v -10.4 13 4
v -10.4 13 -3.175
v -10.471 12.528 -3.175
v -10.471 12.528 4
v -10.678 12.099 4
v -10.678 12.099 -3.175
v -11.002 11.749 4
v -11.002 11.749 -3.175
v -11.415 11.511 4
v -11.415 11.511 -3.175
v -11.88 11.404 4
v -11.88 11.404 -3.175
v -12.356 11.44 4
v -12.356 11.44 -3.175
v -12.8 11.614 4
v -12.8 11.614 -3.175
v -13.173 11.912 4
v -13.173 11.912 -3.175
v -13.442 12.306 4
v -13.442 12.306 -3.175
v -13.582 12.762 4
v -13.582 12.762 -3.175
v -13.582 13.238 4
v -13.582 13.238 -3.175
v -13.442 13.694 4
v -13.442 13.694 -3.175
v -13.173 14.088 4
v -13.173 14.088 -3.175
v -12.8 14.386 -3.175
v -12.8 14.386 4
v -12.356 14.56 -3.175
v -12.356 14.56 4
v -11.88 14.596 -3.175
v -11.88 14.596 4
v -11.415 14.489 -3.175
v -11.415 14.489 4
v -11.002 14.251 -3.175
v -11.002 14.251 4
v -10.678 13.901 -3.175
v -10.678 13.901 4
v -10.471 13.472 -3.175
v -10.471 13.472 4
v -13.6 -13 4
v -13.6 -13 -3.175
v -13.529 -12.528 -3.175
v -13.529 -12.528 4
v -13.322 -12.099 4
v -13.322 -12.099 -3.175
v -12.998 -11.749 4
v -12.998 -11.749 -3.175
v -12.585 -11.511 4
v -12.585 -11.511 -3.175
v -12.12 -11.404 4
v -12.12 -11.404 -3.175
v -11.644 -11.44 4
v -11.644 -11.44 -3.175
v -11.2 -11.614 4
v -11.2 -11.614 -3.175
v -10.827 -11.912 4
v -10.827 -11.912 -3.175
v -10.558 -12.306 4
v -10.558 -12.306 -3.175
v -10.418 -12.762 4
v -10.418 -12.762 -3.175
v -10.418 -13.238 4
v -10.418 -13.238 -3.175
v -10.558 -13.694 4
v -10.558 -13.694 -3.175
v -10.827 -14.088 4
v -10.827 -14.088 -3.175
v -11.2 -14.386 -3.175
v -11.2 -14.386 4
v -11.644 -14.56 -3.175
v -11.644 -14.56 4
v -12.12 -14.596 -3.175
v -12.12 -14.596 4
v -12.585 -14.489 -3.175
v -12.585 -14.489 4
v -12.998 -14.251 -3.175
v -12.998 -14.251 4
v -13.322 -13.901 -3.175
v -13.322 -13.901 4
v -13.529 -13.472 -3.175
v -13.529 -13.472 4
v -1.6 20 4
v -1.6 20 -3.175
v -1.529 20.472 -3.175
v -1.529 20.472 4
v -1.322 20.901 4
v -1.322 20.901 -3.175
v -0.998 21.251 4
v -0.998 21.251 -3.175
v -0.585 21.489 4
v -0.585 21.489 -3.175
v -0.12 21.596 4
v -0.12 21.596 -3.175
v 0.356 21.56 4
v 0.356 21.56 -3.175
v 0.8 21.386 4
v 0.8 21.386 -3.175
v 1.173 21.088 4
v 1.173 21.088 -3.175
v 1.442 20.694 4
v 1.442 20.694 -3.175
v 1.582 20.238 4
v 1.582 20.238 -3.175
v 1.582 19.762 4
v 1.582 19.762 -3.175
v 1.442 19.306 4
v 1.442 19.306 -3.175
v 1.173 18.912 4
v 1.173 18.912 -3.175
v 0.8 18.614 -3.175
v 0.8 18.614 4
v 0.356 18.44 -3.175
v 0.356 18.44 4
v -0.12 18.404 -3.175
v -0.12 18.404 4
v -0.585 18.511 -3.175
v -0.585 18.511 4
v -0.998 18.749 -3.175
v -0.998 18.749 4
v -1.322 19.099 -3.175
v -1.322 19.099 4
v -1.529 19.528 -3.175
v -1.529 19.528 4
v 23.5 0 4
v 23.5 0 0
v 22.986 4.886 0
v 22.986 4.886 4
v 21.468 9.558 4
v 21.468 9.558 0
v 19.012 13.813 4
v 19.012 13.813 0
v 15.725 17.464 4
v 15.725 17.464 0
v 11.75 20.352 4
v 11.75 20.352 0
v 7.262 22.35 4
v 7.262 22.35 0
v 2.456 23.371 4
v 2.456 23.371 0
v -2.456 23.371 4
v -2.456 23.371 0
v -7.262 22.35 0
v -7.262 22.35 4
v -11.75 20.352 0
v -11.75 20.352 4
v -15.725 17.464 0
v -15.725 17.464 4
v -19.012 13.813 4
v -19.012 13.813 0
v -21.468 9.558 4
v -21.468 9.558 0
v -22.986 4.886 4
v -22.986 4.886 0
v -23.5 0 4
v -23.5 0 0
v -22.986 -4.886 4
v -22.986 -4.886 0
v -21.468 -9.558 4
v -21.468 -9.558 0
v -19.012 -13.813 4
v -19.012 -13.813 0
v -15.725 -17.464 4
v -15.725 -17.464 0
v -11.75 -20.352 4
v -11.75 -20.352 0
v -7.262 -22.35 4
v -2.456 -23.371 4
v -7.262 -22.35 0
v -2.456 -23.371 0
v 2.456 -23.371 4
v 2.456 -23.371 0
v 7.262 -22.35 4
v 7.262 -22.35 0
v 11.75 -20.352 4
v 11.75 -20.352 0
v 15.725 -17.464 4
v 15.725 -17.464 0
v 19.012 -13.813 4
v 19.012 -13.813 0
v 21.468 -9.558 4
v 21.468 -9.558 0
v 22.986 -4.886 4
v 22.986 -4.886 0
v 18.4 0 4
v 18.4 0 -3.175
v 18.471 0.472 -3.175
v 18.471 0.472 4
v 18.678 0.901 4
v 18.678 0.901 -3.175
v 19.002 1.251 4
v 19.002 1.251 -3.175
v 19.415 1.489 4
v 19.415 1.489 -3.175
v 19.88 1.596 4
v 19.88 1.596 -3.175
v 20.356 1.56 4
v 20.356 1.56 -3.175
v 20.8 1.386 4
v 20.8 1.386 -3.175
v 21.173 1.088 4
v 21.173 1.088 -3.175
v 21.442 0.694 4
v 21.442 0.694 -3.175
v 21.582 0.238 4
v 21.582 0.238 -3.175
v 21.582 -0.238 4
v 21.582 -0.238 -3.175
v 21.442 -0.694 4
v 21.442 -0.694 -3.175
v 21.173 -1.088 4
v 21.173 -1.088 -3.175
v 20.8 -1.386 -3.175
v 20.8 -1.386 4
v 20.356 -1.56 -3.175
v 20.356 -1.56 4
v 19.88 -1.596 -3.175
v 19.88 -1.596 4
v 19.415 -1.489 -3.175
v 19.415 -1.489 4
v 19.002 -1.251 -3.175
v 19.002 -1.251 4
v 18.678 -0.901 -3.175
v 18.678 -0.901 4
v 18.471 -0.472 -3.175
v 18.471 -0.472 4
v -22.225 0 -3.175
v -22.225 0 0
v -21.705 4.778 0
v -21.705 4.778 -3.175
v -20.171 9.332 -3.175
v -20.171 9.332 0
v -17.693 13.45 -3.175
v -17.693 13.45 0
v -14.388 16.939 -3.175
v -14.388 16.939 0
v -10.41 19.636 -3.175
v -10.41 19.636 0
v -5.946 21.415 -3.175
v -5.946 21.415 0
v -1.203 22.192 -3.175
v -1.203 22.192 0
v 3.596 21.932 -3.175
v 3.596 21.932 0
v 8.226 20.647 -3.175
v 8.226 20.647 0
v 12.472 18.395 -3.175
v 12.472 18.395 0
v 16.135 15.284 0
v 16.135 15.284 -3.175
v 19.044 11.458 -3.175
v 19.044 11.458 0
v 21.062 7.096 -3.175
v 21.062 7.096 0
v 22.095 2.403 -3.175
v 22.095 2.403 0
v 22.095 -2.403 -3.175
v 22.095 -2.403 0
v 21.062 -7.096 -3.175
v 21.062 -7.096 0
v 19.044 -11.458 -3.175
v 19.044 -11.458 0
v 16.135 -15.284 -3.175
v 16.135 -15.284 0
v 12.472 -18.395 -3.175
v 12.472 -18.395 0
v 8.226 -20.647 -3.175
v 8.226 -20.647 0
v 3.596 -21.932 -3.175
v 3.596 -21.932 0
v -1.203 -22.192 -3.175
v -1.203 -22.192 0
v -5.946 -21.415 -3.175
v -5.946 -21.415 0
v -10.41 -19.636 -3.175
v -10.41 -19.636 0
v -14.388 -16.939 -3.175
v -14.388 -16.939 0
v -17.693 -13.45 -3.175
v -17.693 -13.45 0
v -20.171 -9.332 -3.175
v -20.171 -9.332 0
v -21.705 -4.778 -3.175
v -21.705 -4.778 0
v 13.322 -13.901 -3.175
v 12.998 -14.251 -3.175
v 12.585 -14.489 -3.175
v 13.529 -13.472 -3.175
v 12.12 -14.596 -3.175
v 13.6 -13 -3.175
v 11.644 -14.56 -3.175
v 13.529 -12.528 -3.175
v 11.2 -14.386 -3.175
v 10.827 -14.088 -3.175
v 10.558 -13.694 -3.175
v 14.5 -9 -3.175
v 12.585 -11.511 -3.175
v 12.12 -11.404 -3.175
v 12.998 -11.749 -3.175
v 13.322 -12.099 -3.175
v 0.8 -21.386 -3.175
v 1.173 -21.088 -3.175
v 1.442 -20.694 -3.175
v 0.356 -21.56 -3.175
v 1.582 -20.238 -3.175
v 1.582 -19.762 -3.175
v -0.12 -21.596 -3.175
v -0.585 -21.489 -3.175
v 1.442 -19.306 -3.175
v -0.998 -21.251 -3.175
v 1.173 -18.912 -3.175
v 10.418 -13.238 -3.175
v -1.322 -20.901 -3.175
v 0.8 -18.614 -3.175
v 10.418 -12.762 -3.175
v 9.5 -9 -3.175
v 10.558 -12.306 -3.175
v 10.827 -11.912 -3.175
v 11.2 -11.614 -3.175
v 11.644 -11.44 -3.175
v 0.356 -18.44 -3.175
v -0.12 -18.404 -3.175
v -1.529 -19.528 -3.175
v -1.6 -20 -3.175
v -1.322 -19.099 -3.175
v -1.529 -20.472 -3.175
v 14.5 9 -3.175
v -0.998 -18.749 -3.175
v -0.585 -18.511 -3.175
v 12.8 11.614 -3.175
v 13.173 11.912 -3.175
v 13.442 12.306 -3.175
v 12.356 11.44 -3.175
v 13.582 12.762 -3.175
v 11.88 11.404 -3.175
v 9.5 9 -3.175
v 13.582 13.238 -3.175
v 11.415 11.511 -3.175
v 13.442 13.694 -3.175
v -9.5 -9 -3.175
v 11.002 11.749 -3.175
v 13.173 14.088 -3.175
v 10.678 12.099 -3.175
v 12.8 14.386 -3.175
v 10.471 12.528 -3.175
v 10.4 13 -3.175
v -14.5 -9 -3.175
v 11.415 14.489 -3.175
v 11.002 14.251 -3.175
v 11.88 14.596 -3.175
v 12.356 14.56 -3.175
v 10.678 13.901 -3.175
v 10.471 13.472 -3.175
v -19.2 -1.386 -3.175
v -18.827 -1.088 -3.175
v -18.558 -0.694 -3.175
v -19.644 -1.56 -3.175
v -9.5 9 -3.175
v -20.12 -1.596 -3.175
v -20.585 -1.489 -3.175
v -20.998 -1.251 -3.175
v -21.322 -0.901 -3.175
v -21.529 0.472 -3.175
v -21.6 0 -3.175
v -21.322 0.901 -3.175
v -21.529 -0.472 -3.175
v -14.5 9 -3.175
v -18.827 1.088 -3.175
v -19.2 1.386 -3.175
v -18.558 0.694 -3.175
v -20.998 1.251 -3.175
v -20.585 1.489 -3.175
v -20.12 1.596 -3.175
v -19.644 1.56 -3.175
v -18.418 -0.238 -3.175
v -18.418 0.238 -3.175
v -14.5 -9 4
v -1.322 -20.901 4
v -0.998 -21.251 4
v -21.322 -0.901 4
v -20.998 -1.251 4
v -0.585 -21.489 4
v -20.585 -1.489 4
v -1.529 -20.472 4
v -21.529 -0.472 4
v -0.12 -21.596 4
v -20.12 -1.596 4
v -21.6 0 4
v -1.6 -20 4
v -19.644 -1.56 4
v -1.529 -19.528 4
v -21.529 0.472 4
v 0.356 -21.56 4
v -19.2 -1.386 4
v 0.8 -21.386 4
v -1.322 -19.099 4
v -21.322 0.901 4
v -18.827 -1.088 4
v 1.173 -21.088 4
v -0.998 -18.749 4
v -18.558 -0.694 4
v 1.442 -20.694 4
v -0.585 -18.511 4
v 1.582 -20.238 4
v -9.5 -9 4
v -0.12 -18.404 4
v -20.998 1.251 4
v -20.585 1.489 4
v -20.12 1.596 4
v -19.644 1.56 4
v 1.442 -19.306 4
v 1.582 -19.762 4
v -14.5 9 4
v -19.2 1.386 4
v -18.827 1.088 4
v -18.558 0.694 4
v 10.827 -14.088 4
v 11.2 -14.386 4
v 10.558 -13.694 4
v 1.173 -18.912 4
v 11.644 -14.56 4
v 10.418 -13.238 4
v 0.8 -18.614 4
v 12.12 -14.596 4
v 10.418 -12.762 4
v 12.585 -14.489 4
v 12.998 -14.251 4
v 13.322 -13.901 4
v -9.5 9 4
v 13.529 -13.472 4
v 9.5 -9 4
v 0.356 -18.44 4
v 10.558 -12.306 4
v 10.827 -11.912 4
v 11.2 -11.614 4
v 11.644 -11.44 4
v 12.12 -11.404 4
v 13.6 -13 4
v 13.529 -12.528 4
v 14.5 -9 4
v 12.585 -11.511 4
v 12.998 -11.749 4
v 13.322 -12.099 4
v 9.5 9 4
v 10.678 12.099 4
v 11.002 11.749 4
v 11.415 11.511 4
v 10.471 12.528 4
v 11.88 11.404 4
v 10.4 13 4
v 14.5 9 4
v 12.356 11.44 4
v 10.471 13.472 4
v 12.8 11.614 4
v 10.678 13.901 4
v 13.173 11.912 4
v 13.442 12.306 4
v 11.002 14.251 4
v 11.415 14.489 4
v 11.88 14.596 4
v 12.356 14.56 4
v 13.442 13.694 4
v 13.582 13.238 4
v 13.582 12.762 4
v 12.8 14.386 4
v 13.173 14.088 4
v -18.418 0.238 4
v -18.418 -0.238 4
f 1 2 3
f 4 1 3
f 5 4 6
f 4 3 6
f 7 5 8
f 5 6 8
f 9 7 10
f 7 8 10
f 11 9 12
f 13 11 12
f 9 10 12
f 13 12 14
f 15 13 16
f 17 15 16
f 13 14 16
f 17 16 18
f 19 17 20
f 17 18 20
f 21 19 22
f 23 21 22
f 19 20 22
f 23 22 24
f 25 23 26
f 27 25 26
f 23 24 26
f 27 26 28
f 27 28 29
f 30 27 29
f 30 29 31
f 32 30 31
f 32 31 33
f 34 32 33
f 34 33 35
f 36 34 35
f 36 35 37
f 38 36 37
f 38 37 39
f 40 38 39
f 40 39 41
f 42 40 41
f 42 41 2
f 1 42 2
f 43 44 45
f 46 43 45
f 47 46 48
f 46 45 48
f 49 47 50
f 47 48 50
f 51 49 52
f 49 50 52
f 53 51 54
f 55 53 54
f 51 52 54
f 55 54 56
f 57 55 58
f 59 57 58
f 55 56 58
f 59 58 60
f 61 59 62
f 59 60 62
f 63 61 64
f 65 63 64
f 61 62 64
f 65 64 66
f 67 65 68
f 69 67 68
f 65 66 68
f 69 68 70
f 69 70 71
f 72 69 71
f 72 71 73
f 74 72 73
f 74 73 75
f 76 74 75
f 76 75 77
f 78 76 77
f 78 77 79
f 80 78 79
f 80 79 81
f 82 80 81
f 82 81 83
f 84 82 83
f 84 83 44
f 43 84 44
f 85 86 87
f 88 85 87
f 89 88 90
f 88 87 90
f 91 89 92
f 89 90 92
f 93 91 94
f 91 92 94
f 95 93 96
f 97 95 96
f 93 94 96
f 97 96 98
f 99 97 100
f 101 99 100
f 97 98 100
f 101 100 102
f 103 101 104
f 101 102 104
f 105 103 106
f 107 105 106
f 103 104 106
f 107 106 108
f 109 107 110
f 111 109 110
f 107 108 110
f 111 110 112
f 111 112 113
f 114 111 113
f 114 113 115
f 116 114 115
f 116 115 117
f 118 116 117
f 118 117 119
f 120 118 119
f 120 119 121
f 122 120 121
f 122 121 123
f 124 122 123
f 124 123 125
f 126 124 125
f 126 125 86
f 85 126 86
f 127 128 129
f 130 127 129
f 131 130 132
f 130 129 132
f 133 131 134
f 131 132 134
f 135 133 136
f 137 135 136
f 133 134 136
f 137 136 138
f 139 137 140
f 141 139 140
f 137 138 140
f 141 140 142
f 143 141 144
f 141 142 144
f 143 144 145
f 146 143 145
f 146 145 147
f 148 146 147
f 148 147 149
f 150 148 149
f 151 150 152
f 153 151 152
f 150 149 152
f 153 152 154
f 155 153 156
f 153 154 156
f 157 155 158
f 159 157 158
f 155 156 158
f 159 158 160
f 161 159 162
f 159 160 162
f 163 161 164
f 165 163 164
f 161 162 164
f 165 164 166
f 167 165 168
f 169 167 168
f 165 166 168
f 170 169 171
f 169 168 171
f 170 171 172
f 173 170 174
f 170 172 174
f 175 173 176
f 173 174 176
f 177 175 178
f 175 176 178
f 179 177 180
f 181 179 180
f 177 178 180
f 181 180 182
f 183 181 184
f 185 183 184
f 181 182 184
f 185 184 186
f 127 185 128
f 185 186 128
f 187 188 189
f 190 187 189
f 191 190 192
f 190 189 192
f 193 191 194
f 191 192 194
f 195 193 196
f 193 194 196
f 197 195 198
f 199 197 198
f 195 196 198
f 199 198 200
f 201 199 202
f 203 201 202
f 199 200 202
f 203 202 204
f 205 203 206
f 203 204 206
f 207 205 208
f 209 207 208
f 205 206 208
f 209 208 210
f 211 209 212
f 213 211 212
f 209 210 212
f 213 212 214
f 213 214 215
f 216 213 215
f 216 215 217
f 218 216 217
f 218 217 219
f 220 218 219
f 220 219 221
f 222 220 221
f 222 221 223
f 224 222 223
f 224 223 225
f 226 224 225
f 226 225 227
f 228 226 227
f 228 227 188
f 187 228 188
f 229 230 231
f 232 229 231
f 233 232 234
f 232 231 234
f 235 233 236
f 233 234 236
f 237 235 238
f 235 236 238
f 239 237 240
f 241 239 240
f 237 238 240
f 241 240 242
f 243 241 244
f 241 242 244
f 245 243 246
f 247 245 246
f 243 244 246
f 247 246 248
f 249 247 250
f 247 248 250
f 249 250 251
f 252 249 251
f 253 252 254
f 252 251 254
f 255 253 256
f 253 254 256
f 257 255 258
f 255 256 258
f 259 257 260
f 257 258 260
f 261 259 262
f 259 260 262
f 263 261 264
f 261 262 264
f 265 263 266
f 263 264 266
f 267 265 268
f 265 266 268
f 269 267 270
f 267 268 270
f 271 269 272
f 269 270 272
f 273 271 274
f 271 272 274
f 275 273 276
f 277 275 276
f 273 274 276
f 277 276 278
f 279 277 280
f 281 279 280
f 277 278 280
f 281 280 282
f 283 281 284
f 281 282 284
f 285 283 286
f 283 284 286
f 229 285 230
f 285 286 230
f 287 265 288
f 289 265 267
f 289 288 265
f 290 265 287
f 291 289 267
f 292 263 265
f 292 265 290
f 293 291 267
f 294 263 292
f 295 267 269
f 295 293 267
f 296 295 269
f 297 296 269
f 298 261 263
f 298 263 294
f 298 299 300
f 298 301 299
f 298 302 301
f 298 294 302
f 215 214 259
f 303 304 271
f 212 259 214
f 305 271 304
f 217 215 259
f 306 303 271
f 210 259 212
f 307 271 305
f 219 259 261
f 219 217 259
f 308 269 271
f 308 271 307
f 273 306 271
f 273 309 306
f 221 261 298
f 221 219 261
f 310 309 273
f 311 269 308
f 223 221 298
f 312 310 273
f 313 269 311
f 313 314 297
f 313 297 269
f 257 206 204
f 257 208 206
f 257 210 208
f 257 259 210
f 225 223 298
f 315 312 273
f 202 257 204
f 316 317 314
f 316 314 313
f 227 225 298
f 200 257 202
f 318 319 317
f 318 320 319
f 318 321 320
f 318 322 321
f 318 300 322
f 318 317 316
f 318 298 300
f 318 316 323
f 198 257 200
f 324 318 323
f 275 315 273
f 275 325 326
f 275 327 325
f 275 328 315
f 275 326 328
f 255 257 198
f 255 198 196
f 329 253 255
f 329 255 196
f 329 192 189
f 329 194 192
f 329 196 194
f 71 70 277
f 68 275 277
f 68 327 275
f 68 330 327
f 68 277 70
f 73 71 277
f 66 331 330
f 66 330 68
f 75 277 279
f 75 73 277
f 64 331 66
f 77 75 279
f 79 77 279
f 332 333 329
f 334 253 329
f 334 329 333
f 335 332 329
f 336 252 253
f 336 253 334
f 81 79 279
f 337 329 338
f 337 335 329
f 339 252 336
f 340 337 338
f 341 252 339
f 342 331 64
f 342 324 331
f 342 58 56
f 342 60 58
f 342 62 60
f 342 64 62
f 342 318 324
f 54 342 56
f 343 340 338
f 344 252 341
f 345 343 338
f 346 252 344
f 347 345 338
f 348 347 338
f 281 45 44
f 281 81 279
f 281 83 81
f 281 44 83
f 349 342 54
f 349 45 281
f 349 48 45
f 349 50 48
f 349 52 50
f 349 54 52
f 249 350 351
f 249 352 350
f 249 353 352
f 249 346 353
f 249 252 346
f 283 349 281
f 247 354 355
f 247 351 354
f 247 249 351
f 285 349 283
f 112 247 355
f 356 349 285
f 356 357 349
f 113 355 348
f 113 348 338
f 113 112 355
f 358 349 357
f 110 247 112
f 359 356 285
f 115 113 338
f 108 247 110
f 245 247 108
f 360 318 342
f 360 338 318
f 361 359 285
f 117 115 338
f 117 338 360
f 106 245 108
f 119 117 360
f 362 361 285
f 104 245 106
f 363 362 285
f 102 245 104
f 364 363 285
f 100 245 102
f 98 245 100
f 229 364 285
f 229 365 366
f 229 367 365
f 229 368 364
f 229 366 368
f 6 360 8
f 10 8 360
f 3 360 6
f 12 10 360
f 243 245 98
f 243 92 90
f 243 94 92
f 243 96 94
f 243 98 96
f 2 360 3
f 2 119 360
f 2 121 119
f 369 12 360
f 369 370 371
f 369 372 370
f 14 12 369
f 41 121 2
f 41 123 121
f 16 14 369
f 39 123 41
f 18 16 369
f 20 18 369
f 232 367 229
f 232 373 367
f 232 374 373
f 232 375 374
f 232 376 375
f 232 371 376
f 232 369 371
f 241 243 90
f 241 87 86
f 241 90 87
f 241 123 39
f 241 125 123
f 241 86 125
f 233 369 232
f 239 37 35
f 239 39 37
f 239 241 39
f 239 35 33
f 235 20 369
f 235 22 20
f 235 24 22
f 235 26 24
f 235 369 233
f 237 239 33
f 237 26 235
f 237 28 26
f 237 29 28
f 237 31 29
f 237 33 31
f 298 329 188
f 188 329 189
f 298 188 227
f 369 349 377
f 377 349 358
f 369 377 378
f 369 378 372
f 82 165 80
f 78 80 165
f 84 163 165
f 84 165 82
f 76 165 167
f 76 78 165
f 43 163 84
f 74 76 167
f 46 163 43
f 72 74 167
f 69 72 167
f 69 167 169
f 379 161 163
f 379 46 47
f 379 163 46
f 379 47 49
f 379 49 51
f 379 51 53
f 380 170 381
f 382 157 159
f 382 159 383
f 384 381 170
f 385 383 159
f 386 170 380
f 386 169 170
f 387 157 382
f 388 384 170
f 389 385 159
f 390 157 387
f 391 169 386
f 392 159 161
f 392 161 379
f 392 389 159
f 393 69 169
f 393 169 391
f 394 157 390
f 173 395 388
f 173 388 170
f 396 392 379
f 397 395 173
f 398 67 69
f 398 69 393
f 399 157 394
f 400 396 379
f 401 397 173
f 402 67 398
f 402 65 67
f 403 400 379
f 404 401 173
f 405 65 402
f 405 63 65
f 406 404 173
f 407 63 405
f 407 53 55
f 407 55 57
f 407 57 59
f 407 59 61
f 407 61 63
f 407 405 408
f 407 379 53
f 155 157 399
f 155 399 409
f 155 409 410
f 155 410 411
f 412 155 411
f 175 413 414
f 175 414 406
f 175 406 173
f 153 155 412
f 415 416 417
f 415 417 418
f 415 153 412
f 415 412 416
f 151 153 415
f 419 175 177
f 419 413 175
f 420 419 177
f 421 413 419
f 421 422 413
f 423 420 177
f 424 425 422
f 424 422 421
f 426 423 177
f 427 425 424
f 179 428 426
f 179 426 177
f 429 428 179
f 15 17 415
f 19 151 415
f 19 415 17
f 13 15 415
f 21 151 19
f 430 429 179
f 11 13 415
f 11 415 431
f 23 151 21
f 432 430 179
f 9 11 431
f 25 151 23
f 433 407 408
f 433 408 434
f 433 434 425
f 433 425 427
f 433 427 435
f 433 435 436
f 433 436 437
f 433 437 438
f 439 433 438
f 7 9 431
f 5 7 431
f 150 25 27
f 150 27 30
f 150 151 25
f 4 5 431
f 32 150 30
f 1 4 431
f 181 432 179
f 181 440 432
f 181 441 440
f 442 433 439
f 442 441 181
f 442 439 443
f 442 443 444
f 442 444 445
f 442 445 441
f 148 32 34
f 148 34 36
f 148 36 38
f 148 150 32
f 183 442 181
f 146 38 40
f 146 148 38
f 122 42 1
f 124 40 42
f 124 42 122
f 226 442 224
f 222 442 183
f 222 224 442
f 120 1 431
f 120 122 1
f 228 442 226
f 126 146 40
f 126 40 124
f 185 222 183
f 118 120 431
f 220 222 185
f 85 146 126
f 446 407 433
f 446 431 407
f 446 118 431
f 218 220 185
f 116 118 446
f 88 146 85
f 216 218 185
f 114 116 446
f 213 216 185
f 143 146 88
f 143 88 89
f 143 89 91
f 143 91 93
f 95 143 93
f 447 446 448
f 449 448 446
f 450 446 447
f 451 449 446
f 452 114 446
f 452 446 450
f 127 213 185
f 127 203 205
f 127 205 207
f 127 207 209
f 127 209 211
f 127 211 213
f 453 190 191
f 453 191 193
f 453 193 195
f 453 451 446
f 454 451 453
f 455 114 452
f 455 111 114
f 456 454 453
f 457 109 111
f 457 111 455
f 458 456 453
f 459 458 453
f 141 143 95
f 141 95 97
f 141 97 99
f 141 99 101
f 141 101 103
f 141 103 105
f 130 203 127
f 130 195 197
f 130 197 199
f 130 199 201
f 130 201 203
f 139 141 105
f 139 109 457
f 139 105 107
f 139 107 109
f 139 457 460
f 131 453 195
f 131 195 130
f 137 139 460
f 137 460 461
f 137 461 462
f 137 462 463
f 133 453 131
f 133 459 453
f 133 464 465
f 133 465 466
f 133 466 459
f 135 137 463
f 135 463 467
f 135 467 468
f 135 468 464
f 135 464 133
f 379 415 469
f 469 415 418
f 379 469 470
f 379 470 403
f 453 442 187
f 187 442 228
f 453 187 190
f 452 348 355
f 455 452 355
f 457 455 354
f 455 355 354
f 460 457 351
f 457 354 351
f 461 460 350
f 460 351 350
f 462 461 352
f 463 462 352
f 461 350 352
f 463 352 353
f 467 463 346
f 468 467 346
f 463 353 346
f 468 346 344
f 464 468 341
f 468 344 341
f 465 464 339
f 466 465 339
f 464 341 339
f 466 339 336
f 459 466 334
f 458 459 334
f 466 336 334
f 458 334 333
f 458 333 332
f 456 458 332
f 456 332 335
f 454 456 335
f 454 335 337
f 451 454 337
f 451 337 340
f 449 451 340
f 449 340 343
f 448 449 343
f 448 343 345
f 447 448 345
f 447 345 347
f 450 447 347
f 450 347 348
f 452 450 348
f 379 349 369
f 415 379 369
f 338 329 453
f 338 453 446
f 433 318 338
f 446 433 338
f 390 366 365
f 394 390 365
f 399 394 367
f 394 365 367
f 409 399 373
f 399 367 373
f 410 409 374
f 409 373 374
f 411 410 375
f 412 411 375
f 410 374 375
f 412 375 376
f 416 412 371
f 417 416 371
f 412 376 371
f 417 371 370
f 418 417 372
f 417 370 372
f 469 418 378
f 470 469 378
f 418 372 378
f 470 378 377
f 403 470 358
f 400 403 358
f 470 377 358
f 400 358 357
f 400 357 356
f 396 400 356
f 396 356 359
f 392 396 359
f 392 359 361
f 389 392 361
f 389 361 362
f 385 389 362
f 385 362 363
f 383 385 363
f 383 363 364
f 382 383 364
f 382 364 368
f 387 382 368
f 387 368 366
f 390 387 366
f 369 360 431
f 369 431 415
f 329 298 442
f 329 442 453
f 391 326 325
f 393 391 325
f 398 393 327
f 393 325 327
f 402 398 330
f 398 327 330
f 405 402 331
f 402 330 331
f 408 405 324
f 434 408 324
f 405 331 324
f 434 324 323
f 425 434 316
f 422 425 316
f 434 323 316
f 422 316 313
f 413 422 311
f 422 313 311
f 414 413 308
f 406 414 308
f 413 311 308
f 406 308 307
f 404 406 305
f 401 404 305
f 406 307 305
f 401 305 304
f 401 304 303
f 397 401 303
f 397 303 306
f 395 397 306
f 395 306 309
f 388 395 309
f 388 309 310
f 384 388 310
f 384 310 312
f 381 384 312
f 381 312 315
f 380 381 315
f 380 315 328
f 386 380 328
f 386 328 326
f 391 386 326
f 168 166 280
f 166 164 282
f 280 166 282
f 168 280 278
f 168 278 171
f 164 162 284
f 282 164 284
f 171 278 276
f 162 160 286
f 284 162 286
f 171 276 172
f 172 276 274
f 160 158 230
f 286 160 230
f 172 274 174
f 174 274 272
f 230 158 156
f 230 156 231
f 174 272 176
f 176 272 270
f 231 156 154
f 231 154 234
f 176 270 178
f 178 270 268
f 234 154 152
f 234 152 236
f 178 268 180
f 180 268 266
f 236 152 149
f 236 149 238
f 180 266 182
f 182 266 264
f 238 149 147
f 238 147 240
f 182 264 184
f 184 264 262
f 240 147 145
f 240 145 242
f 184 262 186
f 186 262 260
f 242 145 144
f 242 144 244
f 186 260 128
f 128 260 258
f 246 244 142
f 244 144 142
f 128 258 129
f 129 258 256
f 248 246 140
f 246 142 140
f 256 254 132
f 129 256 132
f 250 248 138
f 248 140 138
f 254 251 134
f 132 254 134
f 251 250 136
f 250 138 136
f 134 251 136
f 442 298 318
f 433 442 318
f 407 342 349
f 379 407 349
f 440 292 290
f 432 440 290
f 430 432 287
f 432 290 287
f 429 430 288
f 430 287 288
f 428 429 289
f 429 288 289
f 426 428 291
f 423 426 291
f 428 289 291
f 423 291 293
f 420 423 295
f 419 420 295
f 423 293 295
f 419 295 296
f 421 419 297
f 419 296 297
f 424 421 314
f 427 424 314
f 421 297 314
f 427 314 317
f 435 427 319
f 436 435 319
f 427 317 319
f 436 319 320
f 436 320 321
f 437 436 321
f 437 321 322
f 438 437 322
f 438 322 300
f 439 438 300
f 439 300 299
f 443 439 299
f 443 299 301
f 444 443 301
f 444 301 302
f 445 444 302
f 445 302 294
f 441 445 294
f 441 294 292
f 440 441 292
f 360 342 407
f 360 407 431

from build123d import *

# Parameters (mm, degrees)
SKETCH_1_R          = 23.5
EXTRUDE_1_DEPTH     = 4
SKETCH_2_R          = 22.225
EXTRUDE_2_DEPTH     = 3.175
SKETCH_3_R          = 1.6
CUT_EXTRUDE_1_DEPTH = 34.999715072
SKETCH_4_W          = 5
SKETCH_4_H          = 18
CUT_EXTRUDE_2_DEPTH = 34.999715072
SKETCH_5_R          = 1.6
CUT_EXTRUDE_3_DEPTH = 34.999715072


with BuildPart() as part:
    # ｽｹｯﾁ1 → ﾎﾞｽ - 押し出し1 (new body)
    with BuildSketch(Plane.XY):
        Circle(SKETCH_1_R)
    extrude(amount=EXTRUDE_1_DEPTH)

    # ｽｹｯﾁ2 → ﾎﾞｽ - 押し出し2 (add)
    with BuildSketch(Plane(origin=(0, 0, 0), x_dir=(-1, 0, 0), z_dir=(0, 0, -1))):
        Circle(SKETCH_2_R)
    extrude(amount=EXTRUDE_2_DEPTH)

    # ｽｹｯﾁ3 → ｶｯﾄ - 押し出し1 (cut, through all)
    with BuildSketch(Plane(origin=(0, 0, -3.175), x_dir=(-1, 0, 0), z_dir=(0, 0, -1))):
        with Locations((0, 20)):
            Circle(SKETCH_3_R)
        with Locations((20, 0)):
            Circle(SKETCH_3_R)
        with Locations((0, -20)):
            Circle(SKETCH_3_R)
        with Locations((-20, 0)):
            Circle(SKETCH_3_R)
    extrude(amount=-CUT_EXTRUDE_1_DEPTH, mode=Mode.SUBTRACT)

    # ｽｹｯﾁ4 → ｶｯﾄ - 押し出し2 (cut, through all)
    with BuildSketch(Plane(origin=(0, 0, -3.175), x_dir=(-1, 0, 0), z_dir=(0, 0, -1))):
        with Locations((12, 0)):
            Rectangle(SKETCH_4_W, SKETCH_4_H)
        with Locations((-12, 0)):
            Rectangle(SKETCH_4_W, SKETCH_4_H)
    extrude(amount=-CUT_EXTRUDE_2_DEPTH, mode=Mode.SUBTRACT)

    # ｽｹｯﾁ5 → ｶｯﾄ - 押し出し3 (cut, through all)
    with BuildSketch(Plane(origin=(0, 0, -3.175), x_dir=(-1, 0, 0), z_dir=(0, 0, -1))):
        with Locations((-12, 13)):
            Circle(SKETCH_5_R)
        with Locations(Location((-12, -13, 0), (0, 0, 180))):
            Circle(SKETCH_5_R)
        with Locations((12, -13)):
            Circle(SKETCH_5_R)
        with Locations(Location((12, 13, 0), (0, 0, 180))):
            Circle(SKETCH_5_R)
    extrude(amount=-CUT_EXTRUDE_3_DEPTH, mode=Mode.SUBTRACT)


solid = part.part
